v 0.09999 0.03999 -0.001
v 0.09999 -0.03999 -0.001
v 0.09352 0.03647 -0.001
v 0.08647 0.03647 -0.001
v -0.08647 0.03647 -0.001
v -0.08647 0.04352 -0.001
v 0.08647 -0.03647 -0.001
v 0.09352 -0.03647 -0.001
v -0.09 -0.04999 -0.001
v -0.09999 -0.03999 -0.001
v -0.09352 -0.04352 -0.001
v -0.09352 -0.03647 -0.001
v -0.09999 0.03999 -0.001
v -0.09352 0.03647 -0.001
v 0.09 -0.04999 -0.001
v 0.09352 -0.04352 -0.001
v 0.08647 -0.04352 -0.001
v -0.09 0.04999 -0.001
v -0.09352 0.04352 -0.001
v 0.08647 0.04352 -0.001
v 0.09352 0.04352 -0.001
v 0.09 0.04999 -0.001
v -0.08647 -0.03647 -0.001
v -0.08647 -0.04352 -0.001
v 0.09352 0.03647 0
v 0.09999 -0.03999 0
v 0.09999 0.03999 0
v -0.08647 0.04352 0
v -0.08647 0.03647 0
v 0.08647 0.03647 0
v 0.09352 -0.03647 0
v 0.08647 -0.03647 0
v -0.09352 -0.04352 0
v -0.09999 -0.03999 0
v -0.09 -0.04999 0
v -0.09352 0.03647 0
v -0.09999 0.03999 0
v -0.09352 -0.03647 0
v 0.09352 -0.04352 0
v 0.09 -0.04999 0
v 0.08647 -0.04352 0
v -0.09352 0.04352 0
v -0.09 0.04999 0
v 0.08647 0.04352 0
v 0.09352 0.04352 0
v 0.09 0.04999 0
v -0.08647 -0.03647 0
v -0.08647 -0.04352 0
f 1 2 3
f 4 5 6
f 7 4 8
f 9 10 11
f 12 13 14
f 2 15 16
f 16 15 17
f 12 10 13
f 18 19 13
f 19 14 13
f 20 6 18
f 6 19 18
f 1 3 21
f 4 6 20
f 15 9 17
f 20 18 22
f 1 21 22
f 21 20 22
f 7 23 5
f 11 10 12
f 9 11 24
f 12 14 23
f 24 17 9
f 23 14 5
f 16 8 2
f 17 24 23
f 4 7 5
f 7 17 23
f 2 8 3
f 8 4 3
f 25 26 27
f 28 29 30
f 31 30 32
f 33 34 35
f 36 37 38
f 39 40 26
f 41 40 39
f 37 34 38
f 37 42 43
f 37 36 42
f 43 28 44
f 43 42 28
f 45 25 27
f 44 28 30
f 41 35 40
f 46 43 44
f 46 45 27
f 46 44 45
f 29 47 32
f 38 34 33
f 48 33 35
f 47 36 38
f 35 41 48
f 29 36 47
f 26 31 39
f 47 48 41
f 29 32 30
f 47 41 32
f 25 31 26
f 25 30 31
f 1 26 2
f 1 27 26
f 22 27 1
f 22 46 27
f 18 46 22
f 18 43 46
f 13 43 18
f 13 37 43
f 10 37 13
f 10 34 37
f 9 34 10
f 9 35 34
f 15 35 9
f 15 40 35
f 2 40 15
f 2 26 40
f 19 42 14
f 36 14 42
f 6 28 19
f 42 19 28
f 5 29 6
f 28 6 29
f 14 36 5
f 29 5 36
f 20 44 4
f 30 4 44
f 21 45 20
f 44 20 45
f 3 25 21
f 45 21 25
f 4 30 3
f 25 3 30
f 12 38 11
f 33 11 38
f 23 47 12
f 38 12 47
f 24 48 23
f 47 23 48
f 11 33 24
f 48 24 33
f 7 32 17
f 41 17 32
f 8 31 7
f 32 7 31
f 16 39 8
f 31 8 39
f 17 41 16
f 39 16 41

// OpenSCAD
module rounded_plate() {
    difference() {
        // Main plate with rounded corners
        offset(r=0.01) {
            square([0.18, 0.08], center=true);
        }
        // Corner cutouts
        for (x = [-0.09, 0.09])
        for (y = [-0.04, 0.04])
            translate([x, y])
                rotate(45)
                    polygon(points=[[0.005, 0], [0, 0.005], [-0.005, 0], [0, -0.005]]);
    }
}

translate([0, 0, -0.001])
    linear_extrude(height=0.001)
        rounded_plate();
